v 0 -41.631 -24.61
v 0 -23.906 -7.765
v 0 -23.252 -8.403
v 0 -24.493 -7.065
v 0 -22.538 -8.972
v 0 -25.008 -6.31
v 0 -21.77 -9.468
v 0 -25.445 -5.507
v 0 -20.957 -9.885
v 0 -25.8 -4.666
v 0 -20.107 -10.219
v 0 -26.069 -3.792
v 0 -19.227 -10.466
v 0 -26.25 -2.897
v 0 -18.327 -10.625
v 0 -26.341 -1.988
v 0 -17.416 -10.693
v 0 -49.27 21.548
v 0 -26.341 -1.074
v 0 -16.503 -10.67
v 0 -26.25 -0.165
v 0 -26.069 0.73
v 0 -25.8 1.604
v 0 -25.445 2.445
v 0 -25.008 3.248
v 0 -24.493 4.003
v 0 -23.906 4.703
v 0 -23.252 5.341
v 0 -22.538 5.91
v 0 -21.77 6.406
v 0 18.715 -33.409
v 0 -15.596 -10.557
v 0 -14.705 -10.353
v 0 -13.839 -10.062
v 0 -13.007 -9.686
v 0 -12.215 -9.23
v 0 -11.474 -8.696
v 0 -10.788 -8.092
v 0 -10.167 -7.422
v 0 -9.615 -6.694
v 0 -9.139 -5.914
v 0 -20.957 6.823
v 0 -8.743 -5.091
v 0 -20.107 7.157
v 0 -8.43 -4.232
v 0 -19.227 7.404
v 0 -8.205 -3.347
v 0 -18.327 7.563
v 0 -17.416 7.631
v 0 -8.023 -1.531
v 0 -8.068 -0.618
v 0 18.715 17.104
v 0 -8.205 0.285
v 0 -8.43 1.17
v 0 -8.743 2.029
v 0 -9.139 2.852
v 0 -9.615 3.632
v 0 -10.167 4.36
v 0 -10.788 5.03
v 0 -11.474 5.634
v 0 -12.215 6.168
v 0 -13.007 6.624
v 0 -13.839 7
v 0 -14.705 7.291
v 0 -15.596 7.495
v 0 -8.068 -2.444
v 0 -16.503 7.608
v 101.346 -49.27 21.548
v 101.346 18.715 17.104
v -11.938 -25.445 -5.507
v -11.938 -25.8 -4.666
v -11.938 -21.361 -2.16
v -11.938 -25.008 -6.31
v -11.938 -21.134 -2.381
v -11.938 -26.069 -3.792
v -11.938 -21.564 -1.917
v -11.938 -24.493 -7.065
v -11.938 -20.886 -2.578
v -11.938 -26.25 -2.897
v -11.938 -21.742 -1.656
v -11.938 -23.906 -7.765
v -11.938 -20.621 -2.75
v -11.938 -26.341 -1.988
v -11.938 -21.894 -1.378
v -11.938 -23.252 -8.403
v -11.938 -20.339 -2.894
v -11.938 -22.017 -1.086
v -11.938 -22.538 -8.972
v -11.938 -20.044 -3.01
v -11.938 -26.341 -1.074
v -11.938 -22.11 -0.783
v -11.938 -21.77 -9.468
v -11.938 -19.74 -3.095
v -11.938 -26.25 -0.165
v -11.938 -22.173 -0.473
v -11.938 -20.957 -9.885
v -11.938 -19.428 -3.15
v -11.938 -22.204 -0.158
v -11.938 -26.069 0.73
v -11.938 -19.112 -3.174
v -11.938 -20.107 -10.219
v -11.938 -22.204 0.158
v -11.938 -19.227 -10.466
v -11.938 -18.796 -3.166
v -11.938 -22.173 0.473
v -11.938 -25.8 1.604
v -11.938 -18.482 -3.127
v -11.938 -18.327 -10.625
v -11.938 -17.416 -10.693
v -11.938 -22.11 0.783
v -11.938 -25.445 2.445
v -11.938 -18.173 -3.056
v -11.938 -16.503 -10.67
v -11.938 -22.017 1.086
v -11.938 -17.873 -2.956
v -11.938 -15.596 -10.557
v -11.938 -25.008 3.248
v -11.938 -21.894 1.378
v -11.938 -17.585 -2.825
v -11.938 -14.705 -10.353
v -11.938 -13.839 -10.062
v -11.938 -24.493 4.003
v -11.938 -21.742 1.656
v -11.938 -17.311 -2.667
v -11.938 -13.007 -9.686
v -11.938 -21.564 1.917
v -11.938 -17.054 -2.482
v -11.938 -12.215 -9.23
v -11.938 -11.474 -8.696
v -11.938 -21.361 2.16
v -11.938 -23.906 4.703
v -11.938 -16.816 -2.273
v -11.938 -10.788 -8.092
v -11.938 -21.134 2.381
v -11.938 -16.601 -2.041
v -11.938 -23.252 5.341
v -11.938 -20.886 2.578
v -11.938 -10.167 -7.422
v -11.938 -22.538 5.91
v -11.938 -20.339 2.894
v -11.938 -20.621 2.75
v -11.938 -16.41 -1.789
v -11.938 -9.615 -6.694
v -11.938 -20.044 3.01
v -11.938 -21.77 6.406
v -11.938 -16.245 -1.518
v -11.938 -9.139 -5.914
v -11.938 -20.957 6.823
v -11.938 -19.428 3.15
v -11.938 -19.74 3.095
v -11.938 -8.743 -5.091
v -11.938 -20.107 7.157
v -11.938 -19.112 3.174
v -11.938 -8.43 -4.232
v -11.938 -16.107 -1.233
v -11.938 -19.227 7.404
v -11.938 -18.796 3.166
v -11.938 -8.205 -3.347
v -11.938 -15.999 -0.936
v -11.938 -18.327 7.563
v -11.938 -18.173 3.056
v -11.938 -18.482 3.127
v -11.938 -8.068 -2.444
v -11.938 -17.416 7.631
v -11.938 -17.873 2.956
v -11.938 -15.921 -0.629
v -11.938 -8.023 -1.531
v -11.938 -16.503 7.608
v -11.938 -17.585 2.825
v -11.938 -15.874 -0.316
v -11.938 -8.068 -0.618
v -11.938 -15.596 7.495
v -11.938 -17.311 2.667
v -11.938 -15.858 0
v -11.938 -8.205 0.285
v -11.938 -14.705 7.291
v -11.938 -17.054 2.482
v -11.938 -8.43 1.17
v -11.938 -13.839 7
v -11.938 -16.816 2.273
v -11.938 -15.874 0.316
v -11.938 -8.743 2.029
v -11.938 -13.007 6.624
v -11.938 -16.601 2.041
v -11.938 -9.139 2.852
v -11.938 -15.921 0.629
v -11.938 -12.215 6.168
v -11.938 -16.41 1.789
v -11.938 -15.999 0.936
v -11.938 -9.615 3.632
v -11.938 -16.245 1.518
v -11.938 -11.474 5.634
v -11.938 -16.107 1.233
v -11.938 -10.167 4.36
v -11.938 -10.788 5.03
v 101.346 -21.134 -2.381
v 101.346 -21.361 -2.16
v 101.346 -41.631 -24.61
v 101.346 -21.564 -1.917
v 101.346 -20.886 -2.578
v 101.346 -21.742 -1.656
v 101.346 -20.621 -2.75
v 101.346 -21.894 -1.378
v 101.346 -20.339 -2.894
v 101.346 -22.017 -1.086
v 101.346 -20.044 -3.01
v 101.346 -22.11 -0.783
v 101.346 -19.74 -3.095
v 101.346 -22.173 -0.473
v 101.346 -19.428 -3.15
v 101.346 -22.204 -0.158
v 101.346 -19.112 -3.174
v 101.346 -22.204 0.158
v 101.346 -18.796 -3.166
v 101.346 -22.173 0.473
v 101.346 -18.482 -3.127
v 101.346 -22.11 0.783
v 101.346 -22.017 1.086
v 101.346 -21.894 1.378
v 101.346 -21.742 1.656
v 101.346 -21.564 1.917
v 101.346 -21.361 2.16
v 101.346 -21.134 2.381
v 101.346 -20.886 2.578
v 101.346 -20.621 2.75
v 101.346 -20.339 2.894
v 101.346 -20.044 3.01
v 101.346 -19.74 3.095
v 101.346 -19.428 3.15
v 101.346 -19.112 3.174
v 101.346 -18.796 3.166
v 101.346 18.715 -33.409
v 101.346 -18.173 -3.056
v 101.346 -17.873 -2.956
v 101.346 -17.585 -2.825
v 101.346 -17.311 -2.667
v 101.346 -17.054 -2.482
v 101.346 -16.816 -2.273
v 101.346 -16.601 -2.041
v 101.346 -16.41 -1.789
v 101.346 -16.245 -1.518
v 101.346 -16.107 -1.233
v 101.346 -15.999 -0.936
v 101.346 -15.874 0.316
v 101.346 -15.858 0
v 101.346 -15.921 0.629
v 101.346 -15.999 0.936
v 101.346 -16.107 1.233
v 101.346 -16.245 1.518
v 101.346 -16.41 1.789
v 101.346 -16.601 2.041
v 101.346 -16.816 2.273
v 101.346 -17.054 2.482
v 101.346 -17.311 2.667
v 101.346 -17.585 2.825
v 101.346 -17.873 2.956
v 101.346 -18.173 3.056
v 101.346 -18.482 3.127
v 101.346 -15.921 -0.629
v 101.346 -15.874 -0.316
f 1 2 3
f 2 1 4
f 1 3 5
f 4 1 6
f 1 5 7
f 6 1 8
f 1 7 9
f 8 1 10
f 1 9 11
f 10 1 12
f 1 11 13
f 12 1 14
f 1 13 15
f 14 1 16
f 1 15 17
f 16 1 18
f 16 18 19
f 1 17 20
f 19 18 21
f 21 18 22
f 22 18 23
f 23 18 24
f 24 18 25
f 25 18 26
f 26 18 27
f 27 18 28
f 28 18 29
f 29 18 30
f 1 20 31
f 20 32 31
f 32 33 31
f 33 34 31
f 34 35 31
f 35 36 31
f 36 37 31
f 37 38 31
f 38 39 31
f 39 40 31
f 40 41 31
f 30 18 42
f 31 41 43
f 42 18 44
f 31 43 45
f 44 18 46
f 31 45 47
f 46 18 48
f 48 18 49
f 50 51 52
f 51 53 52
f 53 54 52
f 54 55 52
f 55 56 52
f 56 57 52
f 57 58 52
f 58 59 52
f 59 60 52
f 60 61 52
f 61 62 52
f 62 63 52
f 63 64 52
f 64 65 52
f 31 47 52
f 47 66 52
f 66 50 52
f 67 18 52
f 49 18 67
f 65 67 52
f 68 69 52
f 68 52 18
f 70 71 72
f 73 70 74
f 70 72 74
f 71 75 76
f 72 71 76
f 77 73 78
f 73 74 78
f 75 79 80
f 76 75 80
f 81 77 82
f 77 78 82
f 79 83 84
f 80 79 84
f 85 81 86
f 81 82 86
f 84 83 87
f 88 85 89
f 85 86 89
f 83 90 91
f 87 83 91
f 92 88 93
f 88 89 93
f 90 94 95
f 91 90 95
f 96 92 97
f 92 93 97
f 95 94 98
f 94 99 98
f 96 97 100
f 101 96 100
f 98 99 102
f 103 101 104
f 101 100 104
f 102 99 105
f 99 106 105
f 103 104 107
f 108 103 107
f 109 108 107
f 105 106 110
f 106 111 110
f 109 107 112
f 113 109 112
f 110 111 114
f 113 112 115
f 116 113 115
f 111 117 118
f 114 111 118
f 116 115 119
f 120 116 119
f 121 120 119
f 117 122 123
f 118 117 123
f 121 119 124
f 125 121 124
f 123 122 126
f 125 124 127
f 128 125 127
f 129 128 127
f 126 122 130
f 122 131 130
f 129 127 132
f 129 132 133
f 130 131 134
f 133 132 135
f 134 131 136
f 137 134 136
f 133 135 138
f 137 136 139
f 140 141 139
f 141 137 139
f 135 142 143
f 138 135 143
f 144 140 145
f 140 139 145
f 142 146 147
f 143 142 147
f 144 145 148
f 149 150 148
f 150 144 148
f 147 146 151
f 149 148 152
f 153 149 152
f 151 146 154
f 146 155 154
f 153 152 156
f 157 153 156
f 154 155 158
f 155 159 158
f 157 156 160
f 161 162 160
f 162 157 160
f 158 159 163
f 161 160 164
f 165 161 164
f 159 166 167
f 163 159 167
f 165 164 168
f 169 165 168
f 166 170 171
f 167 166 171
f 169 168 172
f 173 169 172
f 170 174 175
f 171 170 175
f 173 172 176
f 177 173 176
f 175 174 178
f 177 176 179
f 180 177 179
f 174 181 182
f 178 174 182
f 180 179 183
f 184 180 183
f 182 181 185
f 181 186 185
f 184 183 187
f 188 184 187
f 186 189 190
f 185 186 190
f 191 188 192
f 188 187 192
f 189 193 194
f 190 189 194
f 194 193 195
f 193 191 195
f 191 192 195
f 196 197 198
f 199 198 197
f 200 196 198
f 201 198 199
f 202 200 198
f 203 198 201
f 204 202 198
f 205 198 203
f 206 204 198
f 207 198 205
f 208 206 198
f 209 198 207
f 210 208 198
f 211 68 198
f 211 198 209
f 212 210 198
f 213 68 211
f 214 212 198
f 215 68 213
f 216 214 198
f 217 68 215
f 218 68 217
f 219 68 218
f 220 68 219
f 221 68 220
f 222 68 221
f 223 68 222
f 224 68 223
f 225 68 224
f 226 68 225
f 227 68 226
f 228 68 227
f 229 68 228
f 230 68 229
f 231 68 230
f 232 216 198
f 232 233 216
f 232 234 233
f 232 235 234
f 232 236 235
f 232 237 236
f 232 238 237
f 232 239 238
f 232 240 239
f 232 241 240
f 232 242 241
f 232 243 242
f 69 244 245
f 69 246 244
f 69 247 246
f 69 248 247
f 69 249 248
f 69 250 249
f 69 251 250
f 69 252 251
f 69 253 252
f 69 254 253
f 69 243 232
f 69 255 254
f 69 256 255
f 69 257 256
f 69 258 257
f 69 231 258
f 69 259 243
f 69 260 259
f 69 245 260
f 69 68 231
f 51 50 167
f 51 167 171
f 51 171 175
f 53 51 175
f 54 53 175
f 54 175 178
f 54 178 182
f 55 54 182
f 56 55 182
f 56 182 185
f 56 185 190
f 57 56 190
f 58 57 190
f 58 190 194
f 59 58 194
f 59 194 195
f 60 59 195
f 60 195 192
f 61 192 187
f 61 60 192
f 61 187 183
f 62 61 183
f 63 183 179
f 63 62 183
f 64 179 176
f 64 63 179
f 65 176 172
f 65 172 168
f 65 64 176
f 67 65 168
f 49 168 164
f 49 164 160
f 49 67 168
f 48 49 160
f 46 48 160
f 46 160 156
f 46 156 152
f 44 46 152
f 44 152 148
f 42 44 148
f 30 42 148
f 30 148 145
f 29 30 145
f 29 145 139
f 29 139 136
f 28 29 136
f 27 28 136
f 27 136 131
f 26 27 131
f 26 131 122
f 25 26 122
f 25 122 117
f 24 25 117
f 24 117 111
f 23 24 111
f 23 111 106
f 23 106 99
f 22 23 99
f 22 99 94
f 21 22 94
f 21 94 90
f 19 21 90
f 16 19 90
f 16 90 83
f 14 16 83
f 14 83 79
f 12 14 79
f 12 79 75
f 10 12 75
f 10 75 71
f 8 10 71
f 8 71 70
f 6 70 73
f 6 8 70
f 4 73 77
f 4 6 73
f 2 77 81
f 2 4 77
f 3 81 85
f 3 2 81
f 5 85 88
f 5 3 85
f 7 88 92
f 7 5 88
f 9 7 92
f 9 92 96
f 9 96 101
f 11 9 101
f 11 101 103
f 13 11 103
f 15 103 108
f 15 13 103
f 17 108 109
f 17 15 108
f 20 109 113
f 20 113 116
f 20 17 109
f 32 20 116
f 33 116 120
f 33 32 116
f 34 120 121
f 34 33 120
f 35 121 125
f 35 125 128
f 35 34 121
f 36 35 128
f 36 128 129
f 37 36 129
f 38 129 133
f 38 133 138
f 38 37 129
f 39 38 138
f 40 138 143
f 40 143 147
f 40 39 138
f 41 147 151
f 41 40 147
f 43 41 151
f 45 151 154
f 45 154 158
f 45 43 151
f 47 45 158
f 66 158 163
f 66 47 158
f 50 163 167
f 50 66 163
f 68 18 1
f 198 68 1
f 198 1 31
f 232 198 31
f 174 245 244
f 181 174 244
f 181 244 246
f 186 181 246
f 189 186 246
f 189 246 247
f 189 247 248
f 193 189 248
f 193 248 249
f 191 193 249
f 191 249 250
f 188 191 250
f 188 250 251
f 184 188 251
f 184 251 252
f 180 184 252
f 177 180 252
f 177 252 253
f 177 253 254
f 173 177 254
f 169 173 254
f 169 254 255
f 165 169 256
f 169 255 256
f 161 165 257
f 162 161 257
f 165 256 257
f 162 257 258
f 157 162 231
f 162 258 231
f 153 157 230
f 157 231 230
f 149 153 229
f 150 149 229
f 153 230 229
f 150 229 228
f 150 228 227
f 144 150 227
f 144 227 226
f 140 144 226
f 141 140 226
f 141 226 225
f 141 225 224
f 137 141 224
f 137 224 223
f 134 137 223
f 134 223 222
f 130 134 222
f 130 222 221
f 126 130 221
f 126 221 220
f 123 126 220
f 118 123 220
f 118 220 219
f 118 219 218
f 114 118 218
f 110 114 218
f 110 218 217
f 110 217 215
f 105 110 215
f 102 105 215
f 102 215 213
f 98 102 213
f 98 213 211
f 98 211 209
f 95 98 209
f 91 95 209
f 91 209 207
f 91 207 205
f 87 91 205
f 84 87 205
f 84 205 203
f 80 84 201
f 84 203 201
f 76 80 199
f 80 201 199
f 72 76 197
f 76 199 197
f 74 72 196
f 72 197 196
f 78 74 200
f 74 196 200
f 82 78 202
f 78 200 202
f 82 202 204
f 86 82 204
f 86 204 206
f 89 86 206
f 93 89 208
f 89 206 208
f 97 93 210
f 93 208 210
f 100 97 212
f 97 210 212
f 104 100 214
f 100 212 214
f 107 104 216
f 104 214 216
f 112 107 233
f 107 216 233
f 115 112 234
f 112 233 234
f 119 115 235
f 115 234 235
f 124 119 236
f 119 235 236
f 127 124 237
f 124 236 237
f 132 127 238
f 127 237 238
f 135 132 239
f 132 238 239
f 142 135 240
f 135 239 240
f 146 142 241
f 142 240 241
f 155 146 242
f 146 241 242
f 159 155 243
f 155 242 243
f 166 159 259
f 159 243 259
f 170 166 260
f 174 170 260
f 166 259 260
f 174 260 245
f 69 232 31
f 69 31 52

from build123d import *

# Parameters (mm, degrees)
F1_DEPTH = 101.346
F2_R     = 9.164769
F3_DEPTH = 113.284
F5_D     = 6.35


with BuildPart() as f1:
    # F0 (on Right) → F1 (new body)
    with BuildSketch(Plane.YZ):
        Polygon((18.714909, 17.103914), (-49.26987, 21.547778), (-41.631136, -24.609784), (18.714909, -33.40904), align=None)
    extrude(amount=F1_DEPTH)

    # F2 (on face) → F3 (join)
    with BuildSketch(Plane.YZ.offset(101.346)):
        with Locations((-17.187657, -1.531003)):
            Circle(F2_R)
    extrude(amount=-F3_DEPTH)

    # F5 (through all)
    with Locations(Plane(origin=(-11.938, 0, 0), x_dir=(0, -1, 0), z_dir=(-1, 0, 0))):
        with Locations((19.033102, 0)):
            Hole(F5_D / 2)


solid = f1.part
